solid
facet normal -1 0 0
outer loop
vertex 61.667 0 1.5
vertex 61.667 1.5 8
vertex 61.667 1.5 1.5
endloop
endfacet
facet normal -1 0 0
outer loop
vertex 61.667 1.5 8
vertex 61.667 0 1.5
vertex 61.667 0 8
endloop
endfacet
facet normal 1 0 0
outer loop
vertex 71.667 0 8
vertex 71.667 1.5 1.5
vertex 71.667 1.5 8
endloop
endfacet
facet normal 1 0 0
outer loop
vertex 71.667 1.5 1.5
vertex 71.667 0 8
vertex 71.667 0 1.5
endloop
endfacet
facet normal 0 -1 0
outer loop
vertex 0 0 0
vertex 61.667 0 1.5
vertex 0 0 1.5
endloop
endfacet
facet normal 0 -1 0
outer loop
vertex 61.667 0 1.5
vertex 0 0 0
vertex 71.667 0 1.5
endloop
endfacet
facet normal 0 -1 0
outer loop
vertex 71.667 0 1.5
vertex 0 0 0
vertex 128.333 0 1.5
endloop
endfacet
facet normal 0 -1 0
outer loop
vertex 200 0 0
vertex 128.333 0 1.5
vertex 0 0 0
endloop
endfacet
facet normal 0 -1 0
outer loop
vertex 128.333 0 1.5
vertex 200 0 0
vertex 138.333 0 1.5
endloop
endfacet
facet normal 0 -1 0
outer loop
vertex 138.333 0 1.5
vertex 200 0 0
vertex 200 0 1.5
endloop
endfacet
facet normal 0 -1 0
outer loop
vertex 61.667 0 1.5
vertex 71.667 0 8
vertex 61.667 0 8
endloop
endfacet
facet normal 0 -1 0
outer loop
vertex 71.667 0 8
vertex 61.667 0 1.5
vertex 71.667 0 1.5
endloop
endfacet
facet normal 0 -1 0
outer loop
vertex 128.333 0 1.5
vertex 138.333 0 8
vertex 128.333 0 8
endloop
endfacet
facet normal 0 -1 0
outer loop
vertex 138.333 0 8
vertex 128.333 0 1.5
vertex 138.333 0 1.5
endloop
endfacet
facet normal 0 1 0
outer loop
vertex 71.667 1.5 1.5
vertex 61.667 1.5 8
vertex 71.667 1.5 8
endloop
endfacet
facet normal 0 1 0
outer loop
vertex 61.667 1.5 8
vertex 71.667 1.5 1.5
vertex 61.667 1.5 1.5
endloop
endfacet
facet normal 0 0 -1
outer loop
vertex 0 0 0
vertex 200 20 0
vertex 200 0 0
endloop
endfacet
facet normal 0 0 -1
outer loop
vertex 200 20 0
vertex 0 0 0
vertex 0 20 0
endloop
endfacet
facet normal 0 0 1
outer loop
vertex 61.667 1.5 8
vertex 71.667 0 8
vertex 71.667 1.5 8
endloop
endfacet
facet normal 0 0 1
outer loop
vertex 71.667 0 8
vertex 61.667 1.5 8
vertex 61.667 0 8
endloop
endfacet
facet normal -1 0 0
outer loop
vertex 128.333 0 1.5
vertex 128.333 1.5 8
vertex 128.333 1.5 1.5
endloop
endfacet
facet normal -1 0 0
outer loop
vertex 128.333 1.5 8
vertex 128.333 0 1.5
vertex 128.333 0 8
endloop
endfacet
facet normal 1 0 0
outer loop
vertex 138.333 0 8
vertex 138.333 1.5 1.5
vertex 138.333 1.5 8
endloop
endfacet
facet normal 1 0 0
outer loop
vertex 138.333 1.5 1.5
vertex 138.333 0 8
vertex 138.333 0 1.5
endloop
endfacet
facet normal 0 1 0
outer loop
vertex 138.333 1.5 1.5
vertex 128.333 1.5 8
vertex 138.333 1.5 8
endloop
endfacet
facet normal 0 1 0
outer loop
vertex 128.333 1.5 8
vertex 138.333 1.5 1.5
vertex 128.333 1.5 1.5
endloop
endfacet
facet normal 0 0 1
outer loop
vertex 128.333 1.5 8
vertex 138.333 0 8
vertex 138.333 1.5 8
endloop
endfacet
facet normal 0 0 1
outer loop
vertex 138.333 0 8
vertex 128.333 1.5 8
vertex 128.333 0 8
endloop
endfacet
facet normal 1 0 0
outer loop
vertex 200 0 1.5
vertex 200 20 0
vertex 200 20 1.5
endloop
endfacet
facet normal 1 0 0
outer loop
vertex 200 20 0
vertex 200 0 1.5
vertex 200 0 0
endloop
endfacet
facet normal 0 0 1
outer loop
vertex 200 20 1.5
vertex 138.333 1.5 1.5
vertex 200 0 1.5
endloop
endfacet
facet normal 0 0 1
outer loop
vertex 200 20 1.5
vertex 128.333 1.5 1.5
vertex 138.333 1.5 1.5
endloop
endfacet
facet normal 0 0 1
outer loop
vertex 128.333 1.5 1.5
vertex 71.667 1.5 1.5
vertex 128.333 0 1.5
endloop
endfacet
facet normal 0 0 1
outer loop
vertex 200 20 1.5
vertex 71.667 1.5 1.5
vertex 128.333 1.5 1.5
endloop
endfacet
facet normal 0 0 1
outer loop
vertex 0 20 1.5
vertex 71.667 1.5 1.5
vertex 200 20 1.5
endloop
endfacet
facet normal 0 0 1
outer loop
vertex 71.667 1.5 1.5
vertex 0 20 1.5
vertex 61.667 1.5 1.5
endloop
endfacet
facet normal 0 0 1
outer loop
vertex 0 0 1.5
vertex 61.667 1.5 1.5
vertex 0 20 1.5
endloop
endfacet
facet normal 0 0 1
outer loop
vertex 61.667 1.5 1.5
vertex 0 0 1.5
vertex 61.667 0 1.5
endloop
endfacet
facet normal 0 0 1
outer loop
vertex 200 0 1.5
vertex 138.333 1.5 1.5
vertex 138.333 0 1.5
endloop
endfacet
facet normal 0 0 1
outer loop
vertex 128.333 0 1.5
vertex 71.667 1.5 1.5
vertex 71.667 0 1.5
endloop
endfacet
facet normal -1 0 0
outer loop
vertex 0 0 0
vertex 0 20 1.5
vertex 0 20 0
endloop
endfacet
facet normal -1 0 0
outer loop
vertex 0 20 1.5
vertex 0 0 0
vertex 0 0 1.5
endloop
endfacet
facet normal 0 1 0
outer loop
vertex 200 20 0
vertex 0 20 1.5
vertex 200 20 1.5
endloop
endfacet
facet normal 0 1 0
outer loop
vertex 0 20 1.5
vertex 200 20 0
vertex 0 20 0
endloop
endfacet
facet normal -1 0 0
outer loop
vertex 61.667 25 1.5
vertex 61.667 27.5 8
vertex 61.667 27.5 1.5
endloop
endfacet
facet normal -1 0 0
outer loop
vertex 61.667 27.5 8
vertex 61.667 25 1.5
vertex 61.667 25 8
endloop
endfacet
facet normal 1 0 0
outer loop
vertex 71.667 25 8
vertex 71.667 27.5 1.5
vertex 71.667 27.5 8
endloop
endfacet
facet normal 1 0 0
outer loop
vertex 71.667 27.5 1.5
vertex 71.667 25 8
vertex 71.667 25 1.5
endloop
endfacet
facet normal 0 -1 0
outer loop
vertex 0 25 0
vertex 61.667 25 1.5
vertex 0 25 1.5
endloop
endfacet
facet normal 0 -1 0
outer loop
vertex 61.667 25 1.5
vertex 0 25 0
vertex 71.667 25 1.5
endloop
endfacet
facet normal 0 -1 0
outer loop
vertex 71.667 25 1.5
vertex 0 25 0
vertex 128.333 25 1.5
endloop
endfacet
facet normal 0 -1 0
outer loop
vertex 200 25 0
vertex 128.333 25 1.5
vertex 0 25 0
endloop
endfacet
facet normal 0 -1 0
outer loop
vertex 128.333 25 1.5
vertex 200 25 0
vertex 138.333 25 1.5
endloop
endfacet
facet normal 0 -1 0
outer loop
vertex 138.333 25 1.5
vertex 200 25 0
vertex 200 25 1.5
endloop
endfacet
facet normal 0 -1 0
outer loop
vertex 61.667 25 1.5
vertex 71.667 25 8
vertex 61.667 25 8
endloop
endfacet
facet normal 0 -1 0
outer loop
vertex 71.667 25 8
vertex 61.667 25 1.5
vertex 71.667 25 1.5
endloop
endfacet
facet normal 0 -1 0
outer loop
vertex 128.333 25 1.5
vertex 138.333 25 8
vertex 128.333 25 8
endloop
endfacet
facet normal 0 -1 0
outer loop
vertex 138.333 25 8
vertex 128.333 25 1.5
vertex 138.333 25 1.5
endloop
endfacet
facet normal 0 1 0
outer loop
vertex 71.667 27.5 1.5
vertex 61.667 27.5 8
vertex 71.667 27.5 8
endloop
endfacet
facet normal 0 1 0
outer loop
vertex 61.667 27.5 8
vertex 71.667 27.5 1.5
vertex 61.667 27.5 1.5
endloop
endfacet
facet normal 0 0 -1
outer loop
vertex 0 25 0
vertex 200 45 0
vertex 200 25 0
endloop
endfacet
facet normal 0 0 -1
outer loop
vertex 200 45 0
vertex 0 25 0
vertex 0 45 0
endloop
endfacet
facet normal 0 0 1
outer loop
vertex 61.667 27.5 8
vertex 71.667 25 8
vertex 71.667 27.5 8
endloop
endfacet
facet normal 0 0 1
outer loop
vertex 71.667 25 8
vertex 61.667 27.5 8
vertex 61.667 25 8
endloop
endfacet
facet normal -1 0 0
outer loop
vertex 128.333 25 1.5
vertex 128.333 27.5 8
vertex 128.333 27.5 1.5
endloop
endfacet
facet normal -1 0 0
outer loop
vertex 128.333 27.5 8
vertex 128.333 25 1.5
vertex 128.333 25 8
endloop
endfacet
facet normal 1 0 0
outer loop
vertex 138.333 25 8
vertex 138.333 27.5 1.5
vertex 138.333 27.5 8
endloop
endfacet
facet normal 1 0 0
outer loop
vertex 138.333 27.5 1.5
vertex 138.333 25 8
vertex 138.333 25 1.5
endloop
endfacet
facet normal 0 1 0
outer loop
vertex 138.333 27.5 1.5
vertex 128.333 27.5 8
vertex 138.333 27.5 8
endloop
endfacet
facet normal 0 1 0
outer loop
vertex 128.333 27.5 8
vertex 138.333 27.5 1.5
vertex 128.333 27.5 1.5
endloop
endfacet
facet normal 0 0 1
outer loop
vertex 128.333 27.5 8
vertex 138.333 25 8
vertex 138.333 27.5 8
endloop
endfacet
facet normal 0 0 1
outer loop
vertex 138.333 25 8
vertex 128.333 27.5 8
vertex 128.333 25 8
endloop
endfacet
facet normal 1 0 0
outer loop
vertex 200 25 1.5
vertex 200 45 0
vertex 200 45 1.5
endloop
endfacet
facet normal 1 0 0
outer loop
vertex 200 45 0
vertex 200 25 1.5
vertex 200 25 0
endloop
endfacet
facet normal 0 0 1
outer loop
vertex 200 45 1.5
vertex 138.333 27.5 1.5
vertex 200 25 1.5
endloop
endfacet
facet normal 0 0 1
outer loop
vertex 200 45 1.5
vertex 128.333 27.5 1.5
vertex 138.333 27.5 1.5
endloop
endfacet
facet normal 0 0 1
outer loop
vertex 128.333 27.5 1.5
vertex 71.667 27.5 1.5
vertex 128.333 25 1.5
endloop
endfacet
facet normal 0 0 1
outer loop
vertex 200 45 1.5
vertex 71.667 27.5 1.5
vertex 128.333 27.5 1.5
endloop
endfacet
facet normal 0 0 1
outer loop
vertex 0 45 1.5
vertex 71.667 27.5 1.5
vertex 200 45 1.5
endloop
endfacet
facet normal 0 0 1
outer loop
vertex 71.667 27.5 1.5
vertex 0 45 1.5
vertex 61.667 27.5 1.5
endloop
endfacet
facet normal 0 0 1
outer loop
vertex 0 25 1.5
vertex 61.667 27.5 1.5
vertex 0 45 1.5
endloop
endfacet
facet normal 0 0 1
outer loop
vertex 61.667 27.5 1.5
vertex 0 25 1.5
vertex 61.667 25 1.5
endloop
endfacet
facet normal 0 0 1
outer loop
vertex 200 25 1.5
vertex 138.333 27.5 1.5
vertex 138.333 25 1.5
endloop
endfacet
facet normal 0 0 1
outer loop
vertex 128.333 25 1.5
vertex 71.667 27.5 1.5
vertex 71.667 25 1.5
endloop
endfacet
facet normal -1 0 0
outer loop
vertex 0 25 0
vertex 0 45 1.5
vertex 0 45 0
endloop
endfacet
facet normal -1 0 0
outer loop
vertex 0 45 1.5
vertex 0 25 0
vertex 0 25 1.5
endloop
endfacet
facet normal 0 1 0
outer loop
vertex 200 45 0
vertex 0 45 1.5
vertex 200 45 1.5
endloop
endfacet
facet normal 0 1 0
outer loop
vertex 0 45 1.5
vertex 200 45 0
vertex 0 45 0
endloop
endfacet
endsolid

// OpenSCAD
/*
 * a screen to shade the light
 */

$fn=50;

rounding_sphere_diameter = 1;

screen_length = 200;
screen_width = 20;

tab_length = 10;

module screen() {
   cube([screen_length, screen_width, 1.5]);
}

module tab(thickness) {
   cube([10, 8, thickness]);
}

module tabs(thickness) {
   offset_spacing = screen_length/3;
   offsets = [offset_spacing - tab_length/2, offset_spacing*2 - tab_length/2];

   for (offset = offsets) {
      translate([offset, thickness, 0]) {
         rotate([90, 0, 0]) {
            tab(thickness);
         }
      }
   }
}

module full_screen(thickness) {
   screen();
   tabs(thickness);
}

spacing = 25;

//for(s = [0, spacing*1]) {
for(s = [0]) {
   translate([0, s, 0]) {
      full_screen(1.5);
   }
}

//for(s = [spacing*2, spacing*3]) {
for(s = [spacing]) {
   translate([0, s, 0]) {
      full_screen(2.5);
   }
}
